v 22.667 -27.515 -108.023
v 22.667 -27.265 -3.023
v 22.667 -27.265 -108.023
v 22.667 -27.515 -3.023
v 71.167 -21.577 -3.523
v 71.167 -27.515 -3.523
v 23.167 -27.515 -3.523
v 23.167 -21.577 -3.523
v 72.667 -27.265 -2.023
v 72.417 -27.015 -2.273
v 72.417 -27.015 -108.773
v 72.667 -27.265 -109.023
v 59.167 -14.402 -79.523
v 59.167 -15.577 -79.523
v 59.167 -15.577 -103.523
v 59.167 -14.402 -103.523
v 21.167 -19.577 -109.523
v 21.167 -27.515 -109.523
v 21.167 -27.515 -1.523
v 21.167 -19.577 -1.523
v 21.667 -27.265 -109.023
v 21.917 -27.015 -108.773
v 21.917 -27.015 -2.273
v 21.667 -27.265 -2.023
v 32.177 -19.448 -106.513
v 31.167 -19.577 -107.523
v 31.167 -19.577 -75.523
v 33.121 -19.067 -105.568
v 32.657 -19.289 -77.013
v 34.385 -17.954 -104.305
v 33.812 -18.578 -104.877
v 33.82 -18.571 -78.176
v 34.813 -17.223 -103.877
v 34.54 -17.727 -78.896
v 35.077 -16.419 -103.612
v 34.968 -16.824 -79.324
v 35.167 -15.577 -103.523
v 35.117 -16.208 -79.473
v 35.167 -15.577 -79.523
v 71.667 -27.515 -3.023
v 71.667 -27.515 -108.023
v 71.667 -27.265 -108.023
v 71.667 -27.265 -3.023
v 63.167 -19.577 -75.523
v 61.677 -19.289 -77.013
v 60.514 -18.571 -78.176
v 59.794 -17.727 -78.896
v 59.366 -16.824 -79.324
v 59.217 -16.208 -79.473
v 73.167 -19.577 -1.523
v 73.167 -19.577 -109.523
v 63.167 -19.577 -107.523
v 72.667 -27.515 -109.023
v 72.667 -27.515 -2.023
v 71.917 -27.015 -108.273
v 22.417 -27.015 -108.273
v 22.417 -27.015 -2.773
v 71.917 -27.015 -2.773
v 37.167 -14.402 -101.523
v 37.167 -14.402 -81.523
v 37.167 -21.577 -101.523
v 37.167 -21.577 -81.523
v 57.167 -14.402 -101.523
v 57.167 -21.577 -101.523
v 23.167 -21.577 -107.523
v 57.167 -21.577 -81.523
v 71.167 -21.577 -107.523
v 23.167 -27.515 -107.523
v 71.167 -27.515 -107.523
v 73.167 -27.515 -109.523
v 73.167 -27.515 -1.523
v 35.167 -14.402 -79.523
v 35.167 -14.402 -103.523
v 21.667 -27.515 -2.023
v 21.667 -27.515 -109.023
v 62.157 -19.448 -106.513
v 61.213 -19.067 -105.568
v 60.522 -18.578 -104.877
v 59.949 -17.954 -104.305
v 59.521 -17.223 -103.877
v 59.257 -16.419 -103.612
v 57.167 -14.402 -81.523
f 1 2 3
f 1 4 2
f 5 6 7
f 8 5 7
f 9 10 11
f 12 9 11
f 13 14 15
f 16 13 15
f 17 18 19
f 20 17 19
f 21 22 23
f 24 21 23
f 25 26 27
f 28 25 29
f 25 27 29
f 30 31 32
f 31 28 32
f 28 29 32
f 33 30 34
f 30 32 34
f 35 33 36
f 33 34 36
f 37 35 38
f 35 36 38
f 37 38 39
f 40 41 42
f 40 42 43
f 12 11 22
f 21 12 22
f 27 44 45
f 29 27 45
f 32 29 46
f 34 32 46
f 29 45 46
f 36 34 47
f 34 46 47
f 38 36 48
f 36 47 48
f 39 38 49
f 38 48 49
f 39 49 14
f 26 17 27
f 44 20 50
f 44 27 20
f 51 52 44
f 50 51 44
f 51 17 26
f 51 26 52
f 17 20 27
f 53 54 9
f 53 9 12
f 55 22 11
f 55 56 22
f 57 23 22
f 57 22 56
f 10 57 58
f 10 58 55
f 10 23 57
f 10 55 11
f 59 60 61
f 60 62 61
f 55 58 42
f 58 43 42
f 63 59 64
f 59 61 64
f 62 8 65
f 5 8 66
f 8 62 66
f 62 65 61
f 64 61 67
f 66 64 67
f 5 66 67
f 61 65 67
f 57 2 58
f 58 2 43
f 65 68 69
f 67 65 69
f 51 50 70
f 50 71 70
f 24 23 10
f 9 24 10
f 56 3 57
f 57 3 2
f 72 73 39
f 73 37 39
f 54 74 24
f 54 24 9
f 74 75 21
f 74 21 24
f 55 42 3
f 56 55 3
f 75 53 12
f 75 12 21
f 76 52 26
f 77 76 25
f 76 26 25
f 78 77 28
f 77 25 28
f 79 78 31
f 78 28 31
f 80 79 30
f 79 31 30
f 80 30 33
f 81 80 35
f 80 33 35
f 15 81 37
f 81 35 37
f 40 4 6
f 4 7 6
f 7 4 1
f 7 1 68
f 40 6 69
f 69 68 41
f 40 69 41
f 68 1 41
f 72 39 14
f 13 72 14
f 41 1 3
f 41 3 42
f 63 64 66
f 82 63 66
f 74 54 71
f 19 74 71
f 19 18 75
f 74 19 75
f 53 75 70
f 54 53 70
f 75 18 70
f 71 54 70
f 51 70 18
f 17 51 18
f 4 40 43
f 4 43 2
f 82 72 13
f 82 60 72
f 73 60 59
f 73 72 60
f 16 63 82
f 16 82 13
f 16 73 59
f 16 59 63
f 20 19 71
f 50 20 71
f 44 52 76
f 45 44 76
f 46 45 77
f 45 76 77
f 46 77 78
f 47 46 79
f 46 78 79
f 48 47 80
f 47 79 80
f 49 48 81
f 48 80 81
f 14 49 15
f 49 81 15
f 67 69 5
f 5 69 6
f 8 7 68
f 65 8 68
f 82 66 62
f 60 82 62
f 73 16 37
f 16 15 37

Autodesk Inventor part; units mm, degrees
ref_plane "YZ Plane" through (0, 0, 0) normal (1, 0, 0) x (0, 1, 0)
ref_plane "XZ Plane" through (0, 0, 0) normal (0, 1, 0) x (-1, 0, 0)
ref_plane "XY Plane" through (0, 0, 0) normal (0, 0, 1) x (1, 0, 0)
ref_plane "Work Plane1" through (47.167, -27.5147, -55.5227) normal (0, 1, 0) x (1, 0, 0)
sketch "Sketch1" plane through (47.167, -27.5147, -55.5227) normal (0, 1, 0) x (1, 0, 0)
  line L0 (-26, -54) -> (26, -54) projected
  line L1 (-26, 54) -> (-26, -54) projected
  line L2 (-26, -54) -> (26, -54) projected
  line L3 (26, -54) -> (26, 54) projected
  line L4 (26, 54) -> (-26, 54) projected
  line L5 (25.5, 53.5) -> (25.5, -53.5) projected
  line L6 (25.5, -53.5) -> (-25.5, -53.5) projected
  line L7 (-25.5, -53.5) -> (-25.5, 53.5) projected
  line L8 (-25.5, 53.5) -> (25.5, 53.5) projected
  line L9 (-24.5, -52.5) -> (24.5, -52.5) projected
  line L10 (24.5, -52.5) -> (24.5, 52.5) projected
  line L11 (24.5, 52.5) -> (-24.5, 52.5) projected
  line L12 (-24.5, 52.5) -> (-24.5, -52.5) projected
  line L13 (-24, -52) -> (-24, 52) projected
  line L14 (-24, 52) -> (24, 52) projected
  line L15 (24, 52) -> (24, -52) projected
  line L16 (24, -52) -> (-24, -52) projected
  point P0 (-47.167, -55.5227)
extrude "Extrusion1" add sketch "Sketch1" along normal blind 7.9375 contours L1 L4 L3 L0 | L5 L6 L7 L8 | L12 L11 L10 L9
sketch "Sketch2" plane through (47.167, -27.5147, -55.5227) normal (0, -1, 0) x (1, 0, 0)
  line L0 (-26, 54) -> (-26, -54) projected
  line L1 (-26, -54) -> (26, -54) projected
  line L2 (26, -54) -> (26, 54) projected
  line L3 (26, 54) -> (-26, 54) projected
  line L4 (-25, -53) -> (-25, 53) construction
  line L5 (-25, 53) -> (25, 53) construction
  line L6 (25, 53) -> (25, -53) construction
  line L7 (25, -53) -> (-25, -53) construction
  line L8 (-25.5, -53.5) -> (-25.5, 53.5)
  line L9 (-25.5, 53.5) -> (25.5, 53.5)
  line L10 (25.5, 53.5) -> (25.5, -53.5)
  line L11 (25.5, -53.5) -> (-25.5, -53.5)
  line L12 (-24.5, 52.5) -> (-24.5, -52.5)
  line L13 (-24.5, -52.5) -> (24.5, -52.5)
  line L14 (24.5, -52.5) -> (24.5, 52.5)
  line L15 (24.5, 52.5) -> (-24.5, 52.5)
  point P0 (-47.167, 55.5227)
  dimension "d2" = 1
  dimension "d3" = 1
extrude "Extrusion2" cut sketch "Sketch2" against normal blind 0.5 contours L8 L9 L10 L11
chamfer "Chamfer1" distance 0.25 angle 45 8 edges at (71.667, -27.0147, -55.5227) (47.167, -27.0147, -3.0227) (72.667, -27.0147, -55.5227) (47.167, -27.0147, -2.0227) (21.667, -27.0147, -55.5227) (22.667, -27.0147, -55.5227) (47.167, -27.0147, -108.0227) (47.167, -27.0147, -109.0227)
sketch "Sketch3" plane through (47.167, -19.5772, -55.5227) normal (0, 1, 0) x (1, 0, 0)
  line L0 (8, 26) -> (8, 24) projected
  line L1 (12, 24) -> (8, 24) projected
  line L2 (12, 48) -> (12, 24) projected
  line L3 (-12, 48) -> (12, 48) projected
  line L4 (-12, 24) -> (-12, 48) projected
  line L5 (-8, 24) -> (-12, 24) projected
  line L6 (-8, 24) -> (-8, 26) projected
  line L7 (-10, 26) -> (-8, 26) projected
  line L8 (-10, 46) -> (-10, 26) projected
  line L9 (10, 46) -> (-10, 46) projected
  line L10 (10, 26) -> (10, 46) projected
  line L11 (8, 26) -> (10, 26) projected
  line L12 (24, 52) -> (24, -52) projected
  line L13 (-24, 52) -> (24, 52) projected
  line L14 (-24, -52) -> (-24, 52) projected
  line L15 (24, -52) -> (-24, -52) projected
  line L16 (-8, 24) -> (8, 24)
  line L17 (8, 24) -> (8, 26)
  line L18 (8, 26) -> (-8, 26)
  line L19 (-8, 26) -> (-8, 24)
  point P0 (-47.167, -55.5227)
extrude "Extrusion3" add sketch "Sketch3" against normal blind 2 contours L11 L10 L9 L8 L7 L6 L5 L4 L3 L2 L1 L0 | L0 L16 L6 L18 | L12 L15 L14 L13
sketch "Sketch4" plane through (47.167, -19.5772, -55.5227) normal (0, 1, 0) x (1, 0, 0)
  line L0 (10, 26) -> (-10, 26) projected
  line L1 (-10, 26) -> (-10, 46) projected
  line L2 (-10, 46) -> (10, 46) projected
  line L3 (10, 46) -> (10, 26) projected
  line L4 (-26, -54) -> (26, -54) projected
  line L5 (26, -54) -> (26, 54) projected
  line L6 (26, 54) -> (-26, 54) projected
  line L7 (-26, 54) -> (-26, -54) projected
  line L8 (-12, 48) -> (-12, 24)
  line L9 (-12, 24) -> (12, 24)
  line L10 (12, 24) -> (12, 48)
  line L11 (12, 48) -> (-12, 48)
  point P0 (-47.167, -55.5227)
  dimension "d11" = 2
extrude "Extrusion4" add sketch "Sketch4" along normal blind 5.175 contours L11 L10 L9 L8
fillet "Fillet1" radius 4 4 edges at (47.167, -19.5772, -79.5227) (59.167, -19.5772, -91.5227) (47.167, -19.5772, -103.5227) (35.167, -19.5772, -91.5227)
equation "\"d2\" = 0.5 * outerShellThickness"
equation "\"d3\" = 0.5 * outerShellThickness"
equation "\"d9\" = outerShellThickness"
equation "\"d11\" = outerShellThickness"
equation "\"outerShellThickness\" = 2"
properties part number "Mid"
